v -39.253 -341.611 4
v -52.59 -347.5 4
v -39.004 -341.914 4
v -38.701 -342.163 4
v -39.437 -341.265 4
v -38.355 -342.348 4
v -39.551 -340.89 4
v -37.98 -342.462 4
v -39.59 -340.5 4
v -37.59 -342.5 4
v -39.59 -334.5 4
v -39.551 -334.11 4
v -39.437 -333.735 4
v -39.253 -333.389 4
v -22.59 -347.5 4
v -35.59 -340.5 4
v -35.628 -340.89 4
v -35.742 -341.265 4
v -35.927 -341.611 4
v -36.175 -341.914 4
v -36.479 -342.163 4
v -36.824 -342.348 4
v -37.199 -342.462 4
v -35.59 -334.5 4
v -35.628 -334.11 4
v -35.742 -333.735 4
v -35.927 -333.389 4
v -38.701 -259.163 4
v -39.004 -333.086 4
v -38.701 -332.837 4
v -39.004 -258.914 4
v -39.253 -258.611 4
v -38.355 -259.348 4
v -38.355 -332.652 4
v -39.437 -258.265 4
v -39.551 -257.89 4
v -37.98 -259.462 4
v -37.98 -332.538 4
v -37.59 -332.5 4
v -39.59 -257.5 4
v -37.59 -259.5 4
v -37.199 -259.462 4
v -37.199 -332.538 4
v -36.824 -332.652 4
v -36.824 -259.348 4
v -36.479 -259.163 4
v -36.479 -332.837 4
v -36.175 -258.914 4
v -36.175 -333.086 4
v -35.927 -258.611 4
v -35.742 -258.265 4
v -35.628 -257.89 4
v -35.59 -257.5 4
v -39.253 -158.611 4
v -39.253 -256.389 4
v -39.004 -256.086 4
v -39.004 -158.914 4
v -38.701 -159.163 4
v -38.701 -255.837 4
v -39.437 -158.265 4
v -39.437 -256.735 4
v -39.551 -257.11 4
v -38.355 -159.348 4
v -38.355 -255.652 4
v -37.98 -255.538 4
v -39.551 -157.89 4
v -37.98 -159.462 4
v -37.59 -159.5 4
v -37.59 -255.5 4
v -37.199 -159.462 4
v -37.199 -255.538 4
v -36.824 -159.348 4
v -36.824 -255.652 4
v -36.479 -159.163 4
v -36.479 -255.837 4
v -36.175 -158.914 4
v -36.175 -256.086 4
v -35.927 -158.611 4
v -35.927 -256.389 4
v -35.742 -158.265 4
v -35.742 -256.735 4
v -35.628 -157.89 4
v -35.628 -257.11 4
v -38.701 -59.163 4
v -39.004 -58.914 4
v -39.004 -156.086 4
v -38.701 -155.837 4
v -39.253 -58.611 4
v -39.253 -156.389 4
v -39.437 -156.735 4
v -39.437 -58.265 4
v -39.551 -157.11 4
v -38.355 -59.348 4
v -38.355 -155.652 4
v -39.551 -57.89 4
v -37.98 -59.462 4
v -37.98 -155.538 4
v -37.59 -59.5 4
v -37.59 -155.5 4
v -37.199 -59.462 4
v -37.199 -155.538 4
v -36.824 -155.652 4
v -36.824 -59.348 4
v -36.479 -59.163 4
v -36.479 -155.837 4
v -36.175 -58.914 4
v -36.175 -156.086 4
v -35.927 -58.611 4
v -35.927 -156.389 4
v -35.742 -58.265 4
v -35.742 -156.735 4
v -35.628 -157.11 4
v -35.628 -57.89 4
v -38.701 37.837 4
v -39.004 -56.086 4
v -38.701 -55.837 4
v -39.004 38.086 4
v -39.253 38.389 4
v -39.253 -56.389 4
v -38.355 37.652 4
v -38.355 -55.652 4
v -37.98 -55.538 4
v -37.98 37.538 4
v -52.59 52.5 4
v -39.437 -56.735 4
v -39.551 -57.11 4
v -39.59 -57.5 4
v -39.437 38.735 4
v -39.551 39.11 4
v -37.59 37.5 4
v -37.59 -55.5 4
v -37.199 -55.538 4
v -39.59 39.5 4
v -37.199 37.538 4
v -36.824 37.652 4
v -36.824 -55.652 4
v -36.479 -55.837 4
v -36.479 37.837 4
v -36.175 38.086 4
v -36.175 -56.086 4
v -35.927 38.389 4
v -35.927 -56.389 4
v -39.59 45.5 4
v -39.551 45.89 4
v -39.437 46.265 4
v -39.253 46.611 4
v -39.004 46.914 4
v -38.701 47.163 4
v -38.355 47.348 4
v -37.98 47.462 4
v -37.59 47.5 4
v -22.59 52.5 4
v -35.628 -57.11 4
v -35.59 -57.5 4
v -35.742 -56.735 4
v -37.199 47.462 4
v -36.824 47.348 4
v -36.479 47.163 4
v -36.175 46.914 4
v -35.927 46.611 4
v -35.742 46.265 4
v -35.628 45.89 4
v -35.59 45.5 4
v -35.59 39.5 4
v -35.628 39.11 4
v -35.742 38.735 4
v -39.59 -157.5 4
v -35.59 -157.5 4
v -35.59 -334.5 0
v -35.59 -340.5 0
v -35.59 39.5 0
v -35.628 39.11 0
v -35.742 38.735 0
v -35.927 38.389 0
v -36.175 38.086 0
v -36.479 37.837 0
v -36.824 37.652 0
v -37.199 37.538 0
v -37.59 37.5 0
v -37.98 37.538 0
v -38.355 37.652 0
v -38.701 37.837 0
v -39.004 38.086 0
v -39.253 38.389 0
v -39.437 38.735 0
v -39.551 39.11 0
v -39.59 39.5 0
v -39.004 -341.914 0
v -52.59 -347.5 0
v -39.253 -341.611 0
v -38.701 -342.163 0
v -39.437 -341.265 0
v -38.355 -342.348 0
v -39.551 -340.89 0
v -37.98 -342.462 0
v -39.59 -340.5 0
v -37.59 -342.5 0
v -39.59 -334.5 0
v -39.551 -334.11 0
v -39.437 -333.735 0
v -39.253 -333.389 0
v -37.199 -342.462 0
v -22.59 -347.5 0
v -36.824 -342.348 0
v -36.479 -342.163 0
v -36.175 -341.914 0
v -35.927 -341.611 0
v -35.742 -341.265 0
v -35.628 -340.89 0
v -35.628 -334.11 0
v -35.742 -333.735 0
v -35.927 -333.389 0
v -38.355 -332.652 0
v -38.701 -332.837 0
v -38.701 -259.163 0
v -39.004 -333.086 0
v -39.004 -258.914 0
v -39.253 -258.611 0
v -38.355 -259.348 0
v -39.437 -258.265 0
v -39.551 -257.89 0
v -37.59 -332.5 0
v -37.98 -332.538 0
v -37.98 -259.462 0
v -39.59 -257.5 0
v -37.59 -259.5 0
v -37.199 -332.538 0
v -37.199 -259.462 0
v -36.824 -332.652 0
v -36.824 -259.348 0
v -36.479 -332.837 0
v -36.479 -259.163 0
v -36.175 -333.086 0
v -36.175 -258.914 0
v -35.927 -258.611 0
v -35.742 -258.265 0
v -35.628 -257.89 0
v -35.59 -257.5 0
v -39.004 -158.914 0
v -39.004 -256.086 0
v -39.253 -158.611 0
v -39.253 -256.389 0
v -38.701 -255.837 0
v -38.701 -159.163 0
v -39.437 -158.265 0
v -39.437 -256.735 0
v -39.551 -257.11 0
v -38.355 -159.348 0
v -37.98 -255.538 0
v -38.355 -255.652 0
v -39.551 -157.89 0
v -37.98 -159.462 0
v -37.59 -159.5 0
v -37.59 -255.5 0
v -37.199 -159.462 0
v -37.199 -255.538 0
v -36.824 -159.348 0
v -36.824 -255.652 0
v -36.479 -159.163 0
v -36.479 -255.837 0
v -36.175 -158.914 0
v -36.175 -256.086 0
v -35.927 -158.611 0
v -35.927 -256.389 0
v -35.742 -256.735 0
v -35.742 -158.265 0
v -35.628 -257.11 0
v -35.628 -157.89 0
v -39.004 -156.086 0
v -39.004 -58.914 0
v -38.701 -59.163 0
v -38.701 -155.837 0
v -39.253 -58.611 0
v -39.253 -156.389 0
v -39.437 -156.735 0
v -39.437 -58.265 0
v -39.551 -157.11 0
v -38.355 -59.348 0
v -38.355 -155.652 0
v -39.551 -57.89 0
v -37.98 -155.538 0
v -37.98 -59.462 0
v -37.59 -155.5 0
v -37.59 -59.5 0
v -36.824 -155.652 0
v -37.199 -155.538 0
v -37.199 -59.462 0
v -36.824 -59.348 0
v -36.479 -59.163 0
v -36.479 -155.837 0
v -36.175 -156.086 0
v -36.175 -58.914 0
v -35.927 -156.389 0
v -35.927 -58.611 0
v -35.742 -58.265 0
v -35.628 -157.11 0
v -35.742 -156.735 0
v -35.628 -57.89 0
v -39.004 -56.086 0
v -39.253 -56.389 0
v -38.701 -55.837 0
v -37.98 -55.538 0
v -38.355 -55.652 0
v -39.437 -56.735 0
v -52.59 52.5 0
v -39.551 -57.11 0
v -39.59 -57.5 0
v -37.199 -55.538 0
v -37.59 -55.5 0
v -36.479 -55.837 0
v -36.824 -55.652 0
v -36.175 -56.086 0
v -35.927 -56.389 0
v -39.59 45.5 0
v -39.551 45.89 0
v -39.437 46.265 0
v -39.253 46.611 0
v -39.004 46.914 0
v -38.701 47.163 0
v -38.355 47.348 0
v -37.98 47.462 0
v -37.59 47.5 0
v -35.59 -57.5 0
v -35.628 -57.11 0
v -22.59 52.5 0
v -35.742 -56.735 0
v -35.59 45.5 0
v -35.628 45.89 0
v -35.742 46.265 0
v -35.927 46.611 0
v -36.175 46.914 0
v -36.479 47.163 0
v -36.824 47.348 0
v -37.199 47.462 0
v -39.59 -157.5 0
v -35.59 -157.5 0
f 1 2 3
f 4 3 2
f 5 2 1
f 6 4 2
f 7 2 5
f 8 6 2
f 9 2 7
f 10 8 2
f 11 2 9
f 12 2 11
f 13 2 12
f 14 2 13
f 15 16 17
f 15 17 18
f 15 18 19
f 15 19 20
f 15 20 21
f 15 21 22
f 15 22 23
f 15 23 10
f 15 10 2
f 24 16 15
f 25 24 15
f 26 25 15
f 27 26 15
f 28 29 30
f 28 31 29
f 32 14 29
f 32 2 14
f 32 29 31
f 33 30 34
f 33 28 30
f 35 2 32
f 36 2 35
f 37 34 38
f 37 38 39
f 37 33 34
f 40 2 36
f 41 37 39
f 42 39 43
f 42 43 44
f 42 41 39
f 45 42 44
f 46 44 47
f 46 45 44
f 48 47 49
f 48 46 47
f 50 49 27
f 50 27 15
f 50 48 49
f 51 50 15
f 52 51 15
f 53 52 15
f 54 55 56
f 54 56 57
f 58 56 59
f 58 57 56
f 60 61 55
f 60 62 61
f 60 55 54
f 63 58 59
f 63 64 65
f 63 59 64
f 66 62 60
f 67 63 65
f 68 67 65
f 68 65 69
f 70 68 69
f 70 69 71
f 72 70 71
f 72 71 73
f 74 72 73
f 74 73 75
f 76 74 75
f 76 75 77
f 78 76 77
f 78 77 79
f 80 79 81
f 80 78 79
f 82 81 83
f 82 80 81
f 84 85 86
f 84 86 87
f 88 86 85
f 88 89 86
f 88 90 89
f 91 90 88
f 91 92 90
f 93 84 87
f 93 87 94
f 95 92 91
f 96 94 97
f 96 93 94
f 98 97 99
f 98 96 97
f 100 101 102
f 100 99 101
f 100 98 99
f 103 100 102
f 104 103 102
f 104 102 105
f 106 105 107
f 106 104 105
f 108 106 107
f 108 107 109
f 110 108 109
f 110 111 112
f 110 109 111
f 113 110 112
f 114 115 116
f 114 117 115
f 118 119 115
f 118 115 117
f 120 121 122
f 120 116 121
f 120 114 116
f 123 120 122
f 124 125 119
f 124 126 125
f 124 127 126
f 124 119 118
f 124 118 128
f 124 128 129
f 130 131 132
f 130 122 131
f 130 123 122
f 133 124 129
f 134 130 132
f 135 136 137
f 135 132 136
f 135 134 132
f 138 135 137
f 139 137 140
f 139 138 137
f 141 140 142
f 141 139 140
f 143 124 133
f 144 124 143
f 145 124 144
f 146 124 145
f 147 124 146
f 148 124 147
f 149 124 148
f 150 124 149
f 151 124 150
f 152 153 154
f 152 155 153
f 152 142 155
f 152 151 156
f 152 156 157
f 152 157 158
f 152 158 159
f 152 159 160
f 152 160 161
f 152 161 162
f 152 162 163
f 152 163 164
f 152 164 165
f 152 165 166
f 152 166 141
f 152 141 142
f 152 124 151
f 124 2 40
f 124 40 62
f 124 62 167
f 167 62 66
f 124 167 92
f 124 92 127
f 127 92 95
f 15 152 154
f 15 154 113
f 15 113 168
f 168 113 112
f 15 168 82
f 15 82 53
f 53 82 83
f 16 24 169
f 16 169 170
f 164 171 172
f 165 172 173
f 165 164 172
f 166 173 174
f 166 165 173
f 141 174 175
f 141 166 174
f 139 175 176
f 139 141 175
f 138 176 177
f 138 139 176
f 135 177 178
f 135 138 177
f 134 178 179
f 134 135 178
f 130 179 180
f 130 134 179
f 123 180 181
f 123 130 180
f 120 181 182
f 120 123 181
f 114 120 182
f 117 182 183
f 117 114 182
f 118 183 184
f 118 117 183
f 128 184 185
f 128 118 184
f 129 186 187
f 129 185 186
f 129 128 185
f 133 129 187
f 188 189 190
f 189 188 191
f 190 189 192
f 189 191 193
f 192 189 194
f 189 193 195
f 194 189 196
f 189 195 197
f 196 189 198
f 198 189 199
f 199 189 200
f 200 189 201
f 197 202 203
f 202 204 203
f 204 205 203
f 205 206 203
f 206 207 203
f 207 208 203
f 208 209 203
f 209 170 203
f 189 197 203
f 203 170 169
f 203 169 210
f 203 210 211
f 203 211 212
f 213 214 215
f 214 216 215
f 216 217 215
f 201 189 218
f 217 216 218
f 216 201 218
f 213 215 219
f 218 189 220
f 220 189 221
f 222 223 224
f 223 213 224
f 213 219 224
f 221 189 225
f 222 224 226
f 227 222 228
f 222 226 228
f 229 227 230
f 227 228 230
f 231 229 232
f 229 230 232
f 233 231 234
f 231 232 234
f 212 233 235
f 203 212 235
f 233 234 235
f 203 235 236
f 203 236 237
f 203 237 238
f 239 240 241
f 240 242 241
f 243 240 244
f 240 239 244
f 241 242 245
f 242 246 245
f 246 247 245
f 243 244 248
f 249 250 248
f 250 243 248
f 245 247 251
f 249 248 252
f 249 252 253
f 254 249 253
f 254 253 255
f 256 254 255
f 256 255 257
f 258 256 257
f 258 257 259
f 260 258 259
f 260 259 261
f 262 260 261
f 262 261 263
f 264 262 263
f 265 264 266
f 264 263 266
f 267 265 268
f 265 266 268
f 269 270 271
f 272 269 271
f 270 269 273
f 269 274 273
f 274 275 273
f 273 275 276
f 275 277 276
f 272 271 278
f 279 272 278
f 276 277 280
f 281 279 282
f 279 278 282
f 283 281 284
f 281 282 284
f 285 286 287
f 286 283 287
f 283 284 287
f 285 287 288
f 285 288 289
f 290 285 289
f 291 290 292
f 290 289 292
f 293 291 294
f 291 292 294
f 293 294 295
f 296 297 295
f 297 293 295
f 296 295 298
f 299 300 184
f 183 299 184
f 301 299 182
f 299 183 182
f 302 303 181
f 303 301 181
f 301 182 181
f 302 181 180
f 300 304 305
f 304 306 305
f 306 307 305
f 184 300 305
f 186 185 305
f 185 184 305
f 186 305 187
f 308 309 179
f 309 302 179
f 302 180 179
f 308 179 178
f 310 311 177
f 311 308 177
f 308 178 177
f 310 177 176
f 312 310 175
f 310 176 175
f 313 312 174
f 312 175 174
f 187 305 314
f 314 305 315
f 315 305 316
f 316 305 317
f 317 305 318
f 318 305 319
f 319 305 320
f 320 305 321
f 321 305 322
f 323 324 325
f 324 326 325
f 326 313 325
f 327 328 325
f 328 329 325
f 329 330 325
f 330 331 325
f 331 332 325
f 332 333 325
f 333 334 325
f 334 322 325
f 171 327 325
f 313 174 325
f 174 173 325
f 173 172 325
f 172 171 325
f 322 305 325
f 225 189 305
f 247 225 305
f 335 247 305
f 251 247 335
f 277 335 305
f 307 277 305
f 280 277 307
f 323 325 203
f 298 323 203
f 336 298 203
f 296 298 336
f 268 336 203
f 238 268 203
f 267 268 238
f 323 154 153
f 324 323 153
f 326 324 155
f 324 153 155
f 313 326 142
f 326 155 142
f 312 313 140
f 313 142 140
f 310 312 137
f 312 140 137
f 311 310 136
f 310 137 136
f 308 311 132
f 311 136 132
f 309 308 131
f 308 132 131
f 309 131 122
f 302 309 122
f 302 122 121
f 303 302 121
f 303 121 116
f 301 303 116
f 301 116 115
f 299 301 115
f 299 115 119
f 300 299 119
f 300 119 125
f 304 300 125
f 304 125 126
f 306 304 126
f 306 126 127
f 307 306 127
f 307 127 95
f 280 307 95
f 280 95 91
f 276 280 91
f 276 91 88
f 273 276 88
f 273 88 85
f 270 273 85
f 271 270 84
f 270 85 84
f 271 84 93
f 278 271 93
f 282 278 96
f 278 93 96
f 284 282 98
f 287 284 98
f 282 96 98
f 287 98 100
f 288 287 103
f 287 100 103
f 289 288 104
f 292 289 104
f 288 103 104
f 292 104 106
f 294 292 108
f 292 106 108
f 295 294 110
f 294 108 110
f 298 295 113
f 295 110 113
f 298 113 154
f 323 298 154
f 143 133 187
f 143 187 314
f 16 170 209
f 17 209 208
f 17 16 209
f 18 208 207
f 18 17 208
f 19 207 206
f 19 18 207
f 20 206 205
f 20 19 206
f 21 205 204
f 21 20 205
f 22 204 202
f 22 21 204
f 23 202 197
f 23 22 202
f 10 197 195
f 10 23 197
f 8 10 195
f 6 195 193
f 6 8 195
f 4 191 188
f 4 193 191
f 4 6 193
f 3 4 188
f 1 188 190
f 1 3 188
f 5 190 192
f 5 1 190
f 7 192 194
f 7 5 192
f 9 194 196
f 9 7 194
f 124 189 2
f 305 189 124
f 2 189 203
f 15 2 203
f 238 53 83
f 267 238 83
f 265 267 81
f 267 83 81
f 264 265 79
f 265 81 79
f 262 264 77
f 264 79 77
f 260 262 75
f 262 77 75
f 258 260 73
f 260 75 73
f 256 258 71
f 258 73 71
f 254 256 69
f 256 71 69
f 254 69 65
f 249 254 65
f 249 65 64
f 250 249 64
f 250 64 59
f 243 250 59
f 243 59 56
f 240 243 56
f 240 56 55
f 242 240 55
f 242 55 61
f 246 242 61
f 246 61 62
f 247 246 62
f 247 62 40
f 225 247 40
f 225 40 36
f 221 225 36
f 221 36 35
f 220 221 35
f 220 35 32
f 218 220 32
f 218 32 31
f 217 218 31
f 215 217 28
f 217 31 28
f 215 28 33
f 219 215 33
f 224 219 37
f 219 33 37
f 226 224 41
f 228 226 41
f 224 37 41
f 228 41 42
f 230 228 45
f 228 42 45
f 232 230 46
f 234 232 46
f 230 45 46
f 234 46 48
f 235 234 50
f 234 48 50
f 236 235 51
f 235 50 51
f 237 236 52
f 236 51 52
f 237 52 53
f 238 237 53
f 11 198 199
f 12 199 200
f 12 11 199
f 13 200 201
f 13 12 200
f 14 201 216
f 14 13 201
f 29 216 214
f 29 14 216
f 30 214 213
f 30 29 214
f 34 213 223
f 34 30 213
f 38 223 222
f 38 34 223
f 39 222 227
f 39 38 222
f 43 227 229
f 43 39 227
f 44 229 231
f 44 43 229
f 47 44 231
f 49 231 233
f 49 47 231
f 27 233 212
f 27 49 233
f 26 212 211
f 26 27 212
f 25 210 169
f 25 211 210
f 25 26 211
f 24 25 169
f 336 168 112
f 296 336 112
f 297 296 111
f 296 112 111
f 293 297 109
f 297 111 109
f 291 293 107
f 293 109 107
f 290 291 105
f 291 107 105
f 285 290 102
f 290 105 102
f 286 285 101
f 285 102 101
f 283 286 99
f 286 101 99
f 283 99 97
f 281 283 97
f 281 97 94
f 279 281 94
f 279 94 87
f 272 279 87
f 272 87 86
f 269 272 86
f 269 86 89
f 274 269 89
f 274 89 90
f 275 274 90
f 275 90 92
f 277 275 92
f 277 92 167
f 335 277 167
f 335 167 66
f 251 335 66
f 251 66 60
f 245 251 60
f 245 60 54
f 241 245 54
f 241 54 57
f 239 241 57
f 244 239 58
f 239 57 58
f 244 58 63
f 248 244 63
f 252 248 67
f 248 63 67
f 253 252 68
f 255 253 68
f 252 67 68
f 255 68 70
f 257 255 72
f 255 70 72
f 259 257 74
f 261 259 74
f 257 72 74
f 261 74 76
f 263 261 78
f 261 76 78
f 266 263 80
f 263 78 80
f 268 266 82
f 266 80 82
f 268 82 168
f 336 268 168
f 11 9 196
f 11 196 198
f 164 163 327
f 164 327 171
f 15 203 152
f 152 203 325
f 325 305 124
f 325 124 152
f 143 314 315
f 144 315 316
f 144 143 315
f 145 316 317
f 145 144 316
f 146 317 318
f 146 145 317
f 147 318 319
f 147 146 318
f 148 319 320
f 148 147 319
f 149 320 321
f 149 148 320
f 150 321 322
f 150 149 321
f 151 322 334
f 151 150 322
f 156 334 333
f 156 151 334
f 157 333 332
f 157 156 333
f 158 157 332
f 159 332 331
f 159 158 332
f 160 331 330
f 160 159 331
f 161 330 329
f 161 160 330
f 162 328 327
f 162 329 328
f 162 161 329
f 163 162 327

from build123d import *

# Parameters (mm, degrees)
ESQUISSE1_W             = 30
ESQUISSE1_H             = 400
BOSS_EXTRU_1_DEPTH      = 4
ESQUISSE2_R             = 2
ENL_V_MAT_EXTRU_1_DEPTH = 5


with BuildPart() as part:
    # Esquisse1 → Boss.-Extru.1 (new body)
    with BuildSketch(Plane.XY):
        with Locations((-37.589678395, -147.5)):
            Rectangle(ESQUISSE1_W, ESQUISSE1_H)
    extrude(amount=BOSS_EXTRU_1_DEPTH)

    # Esquisse2 → Enlèv. mat.-Extru.1 (cut, through all)
    with BuildSketch(Plane.XY.offset(4)):
        with Locations((-37.589678395, -57.5)):
            Circle(ESQUISSE2_R)
        with Locations((-37.589678395, -257.5)):
            Circle(ESQUISSE2_R)
        with Locations((-37.589678395, -157.5)):
            Circle(ESQUISSE2_R)
        with BuildLine():
            Line((-35.589678395, 45.5), (-35.589678395, 39.5))
            ThreePointArc((-35.589678395, 39.5), (-37.589678395, 37.5), (-39.589678395, 39.5))
            Line((-39.589678395, 39.5), (-39.589678395, 45.5))
            ThreePointArc((-39.589678395, 45.5), (-37.589678395, 47.5), (-35.589678395, 45.5))
        make_face()
        with BuildLine():
            Line((-35.589678395, -334.499998934), (-35.589678395, -340.500001066))
            ThreePointArc((-35.589678395, -340.500001066), (-37.589678395, -342.5), (-39.589678395, -340.500001066))
            Line((-39.589678395, -340.500001066), (-39.589678395, -334.499998934))
            ThreePointArc((-39.589678395, -334.499998934), (-37.589678395, -332.499998934), (-35.589678395, -334.499998934))
        make_face()
    extrude(amount=-ENL_V_MAT_EXTRU_1_DEPTH, mode=Mode.SUBTRACT)


solid = part.part
